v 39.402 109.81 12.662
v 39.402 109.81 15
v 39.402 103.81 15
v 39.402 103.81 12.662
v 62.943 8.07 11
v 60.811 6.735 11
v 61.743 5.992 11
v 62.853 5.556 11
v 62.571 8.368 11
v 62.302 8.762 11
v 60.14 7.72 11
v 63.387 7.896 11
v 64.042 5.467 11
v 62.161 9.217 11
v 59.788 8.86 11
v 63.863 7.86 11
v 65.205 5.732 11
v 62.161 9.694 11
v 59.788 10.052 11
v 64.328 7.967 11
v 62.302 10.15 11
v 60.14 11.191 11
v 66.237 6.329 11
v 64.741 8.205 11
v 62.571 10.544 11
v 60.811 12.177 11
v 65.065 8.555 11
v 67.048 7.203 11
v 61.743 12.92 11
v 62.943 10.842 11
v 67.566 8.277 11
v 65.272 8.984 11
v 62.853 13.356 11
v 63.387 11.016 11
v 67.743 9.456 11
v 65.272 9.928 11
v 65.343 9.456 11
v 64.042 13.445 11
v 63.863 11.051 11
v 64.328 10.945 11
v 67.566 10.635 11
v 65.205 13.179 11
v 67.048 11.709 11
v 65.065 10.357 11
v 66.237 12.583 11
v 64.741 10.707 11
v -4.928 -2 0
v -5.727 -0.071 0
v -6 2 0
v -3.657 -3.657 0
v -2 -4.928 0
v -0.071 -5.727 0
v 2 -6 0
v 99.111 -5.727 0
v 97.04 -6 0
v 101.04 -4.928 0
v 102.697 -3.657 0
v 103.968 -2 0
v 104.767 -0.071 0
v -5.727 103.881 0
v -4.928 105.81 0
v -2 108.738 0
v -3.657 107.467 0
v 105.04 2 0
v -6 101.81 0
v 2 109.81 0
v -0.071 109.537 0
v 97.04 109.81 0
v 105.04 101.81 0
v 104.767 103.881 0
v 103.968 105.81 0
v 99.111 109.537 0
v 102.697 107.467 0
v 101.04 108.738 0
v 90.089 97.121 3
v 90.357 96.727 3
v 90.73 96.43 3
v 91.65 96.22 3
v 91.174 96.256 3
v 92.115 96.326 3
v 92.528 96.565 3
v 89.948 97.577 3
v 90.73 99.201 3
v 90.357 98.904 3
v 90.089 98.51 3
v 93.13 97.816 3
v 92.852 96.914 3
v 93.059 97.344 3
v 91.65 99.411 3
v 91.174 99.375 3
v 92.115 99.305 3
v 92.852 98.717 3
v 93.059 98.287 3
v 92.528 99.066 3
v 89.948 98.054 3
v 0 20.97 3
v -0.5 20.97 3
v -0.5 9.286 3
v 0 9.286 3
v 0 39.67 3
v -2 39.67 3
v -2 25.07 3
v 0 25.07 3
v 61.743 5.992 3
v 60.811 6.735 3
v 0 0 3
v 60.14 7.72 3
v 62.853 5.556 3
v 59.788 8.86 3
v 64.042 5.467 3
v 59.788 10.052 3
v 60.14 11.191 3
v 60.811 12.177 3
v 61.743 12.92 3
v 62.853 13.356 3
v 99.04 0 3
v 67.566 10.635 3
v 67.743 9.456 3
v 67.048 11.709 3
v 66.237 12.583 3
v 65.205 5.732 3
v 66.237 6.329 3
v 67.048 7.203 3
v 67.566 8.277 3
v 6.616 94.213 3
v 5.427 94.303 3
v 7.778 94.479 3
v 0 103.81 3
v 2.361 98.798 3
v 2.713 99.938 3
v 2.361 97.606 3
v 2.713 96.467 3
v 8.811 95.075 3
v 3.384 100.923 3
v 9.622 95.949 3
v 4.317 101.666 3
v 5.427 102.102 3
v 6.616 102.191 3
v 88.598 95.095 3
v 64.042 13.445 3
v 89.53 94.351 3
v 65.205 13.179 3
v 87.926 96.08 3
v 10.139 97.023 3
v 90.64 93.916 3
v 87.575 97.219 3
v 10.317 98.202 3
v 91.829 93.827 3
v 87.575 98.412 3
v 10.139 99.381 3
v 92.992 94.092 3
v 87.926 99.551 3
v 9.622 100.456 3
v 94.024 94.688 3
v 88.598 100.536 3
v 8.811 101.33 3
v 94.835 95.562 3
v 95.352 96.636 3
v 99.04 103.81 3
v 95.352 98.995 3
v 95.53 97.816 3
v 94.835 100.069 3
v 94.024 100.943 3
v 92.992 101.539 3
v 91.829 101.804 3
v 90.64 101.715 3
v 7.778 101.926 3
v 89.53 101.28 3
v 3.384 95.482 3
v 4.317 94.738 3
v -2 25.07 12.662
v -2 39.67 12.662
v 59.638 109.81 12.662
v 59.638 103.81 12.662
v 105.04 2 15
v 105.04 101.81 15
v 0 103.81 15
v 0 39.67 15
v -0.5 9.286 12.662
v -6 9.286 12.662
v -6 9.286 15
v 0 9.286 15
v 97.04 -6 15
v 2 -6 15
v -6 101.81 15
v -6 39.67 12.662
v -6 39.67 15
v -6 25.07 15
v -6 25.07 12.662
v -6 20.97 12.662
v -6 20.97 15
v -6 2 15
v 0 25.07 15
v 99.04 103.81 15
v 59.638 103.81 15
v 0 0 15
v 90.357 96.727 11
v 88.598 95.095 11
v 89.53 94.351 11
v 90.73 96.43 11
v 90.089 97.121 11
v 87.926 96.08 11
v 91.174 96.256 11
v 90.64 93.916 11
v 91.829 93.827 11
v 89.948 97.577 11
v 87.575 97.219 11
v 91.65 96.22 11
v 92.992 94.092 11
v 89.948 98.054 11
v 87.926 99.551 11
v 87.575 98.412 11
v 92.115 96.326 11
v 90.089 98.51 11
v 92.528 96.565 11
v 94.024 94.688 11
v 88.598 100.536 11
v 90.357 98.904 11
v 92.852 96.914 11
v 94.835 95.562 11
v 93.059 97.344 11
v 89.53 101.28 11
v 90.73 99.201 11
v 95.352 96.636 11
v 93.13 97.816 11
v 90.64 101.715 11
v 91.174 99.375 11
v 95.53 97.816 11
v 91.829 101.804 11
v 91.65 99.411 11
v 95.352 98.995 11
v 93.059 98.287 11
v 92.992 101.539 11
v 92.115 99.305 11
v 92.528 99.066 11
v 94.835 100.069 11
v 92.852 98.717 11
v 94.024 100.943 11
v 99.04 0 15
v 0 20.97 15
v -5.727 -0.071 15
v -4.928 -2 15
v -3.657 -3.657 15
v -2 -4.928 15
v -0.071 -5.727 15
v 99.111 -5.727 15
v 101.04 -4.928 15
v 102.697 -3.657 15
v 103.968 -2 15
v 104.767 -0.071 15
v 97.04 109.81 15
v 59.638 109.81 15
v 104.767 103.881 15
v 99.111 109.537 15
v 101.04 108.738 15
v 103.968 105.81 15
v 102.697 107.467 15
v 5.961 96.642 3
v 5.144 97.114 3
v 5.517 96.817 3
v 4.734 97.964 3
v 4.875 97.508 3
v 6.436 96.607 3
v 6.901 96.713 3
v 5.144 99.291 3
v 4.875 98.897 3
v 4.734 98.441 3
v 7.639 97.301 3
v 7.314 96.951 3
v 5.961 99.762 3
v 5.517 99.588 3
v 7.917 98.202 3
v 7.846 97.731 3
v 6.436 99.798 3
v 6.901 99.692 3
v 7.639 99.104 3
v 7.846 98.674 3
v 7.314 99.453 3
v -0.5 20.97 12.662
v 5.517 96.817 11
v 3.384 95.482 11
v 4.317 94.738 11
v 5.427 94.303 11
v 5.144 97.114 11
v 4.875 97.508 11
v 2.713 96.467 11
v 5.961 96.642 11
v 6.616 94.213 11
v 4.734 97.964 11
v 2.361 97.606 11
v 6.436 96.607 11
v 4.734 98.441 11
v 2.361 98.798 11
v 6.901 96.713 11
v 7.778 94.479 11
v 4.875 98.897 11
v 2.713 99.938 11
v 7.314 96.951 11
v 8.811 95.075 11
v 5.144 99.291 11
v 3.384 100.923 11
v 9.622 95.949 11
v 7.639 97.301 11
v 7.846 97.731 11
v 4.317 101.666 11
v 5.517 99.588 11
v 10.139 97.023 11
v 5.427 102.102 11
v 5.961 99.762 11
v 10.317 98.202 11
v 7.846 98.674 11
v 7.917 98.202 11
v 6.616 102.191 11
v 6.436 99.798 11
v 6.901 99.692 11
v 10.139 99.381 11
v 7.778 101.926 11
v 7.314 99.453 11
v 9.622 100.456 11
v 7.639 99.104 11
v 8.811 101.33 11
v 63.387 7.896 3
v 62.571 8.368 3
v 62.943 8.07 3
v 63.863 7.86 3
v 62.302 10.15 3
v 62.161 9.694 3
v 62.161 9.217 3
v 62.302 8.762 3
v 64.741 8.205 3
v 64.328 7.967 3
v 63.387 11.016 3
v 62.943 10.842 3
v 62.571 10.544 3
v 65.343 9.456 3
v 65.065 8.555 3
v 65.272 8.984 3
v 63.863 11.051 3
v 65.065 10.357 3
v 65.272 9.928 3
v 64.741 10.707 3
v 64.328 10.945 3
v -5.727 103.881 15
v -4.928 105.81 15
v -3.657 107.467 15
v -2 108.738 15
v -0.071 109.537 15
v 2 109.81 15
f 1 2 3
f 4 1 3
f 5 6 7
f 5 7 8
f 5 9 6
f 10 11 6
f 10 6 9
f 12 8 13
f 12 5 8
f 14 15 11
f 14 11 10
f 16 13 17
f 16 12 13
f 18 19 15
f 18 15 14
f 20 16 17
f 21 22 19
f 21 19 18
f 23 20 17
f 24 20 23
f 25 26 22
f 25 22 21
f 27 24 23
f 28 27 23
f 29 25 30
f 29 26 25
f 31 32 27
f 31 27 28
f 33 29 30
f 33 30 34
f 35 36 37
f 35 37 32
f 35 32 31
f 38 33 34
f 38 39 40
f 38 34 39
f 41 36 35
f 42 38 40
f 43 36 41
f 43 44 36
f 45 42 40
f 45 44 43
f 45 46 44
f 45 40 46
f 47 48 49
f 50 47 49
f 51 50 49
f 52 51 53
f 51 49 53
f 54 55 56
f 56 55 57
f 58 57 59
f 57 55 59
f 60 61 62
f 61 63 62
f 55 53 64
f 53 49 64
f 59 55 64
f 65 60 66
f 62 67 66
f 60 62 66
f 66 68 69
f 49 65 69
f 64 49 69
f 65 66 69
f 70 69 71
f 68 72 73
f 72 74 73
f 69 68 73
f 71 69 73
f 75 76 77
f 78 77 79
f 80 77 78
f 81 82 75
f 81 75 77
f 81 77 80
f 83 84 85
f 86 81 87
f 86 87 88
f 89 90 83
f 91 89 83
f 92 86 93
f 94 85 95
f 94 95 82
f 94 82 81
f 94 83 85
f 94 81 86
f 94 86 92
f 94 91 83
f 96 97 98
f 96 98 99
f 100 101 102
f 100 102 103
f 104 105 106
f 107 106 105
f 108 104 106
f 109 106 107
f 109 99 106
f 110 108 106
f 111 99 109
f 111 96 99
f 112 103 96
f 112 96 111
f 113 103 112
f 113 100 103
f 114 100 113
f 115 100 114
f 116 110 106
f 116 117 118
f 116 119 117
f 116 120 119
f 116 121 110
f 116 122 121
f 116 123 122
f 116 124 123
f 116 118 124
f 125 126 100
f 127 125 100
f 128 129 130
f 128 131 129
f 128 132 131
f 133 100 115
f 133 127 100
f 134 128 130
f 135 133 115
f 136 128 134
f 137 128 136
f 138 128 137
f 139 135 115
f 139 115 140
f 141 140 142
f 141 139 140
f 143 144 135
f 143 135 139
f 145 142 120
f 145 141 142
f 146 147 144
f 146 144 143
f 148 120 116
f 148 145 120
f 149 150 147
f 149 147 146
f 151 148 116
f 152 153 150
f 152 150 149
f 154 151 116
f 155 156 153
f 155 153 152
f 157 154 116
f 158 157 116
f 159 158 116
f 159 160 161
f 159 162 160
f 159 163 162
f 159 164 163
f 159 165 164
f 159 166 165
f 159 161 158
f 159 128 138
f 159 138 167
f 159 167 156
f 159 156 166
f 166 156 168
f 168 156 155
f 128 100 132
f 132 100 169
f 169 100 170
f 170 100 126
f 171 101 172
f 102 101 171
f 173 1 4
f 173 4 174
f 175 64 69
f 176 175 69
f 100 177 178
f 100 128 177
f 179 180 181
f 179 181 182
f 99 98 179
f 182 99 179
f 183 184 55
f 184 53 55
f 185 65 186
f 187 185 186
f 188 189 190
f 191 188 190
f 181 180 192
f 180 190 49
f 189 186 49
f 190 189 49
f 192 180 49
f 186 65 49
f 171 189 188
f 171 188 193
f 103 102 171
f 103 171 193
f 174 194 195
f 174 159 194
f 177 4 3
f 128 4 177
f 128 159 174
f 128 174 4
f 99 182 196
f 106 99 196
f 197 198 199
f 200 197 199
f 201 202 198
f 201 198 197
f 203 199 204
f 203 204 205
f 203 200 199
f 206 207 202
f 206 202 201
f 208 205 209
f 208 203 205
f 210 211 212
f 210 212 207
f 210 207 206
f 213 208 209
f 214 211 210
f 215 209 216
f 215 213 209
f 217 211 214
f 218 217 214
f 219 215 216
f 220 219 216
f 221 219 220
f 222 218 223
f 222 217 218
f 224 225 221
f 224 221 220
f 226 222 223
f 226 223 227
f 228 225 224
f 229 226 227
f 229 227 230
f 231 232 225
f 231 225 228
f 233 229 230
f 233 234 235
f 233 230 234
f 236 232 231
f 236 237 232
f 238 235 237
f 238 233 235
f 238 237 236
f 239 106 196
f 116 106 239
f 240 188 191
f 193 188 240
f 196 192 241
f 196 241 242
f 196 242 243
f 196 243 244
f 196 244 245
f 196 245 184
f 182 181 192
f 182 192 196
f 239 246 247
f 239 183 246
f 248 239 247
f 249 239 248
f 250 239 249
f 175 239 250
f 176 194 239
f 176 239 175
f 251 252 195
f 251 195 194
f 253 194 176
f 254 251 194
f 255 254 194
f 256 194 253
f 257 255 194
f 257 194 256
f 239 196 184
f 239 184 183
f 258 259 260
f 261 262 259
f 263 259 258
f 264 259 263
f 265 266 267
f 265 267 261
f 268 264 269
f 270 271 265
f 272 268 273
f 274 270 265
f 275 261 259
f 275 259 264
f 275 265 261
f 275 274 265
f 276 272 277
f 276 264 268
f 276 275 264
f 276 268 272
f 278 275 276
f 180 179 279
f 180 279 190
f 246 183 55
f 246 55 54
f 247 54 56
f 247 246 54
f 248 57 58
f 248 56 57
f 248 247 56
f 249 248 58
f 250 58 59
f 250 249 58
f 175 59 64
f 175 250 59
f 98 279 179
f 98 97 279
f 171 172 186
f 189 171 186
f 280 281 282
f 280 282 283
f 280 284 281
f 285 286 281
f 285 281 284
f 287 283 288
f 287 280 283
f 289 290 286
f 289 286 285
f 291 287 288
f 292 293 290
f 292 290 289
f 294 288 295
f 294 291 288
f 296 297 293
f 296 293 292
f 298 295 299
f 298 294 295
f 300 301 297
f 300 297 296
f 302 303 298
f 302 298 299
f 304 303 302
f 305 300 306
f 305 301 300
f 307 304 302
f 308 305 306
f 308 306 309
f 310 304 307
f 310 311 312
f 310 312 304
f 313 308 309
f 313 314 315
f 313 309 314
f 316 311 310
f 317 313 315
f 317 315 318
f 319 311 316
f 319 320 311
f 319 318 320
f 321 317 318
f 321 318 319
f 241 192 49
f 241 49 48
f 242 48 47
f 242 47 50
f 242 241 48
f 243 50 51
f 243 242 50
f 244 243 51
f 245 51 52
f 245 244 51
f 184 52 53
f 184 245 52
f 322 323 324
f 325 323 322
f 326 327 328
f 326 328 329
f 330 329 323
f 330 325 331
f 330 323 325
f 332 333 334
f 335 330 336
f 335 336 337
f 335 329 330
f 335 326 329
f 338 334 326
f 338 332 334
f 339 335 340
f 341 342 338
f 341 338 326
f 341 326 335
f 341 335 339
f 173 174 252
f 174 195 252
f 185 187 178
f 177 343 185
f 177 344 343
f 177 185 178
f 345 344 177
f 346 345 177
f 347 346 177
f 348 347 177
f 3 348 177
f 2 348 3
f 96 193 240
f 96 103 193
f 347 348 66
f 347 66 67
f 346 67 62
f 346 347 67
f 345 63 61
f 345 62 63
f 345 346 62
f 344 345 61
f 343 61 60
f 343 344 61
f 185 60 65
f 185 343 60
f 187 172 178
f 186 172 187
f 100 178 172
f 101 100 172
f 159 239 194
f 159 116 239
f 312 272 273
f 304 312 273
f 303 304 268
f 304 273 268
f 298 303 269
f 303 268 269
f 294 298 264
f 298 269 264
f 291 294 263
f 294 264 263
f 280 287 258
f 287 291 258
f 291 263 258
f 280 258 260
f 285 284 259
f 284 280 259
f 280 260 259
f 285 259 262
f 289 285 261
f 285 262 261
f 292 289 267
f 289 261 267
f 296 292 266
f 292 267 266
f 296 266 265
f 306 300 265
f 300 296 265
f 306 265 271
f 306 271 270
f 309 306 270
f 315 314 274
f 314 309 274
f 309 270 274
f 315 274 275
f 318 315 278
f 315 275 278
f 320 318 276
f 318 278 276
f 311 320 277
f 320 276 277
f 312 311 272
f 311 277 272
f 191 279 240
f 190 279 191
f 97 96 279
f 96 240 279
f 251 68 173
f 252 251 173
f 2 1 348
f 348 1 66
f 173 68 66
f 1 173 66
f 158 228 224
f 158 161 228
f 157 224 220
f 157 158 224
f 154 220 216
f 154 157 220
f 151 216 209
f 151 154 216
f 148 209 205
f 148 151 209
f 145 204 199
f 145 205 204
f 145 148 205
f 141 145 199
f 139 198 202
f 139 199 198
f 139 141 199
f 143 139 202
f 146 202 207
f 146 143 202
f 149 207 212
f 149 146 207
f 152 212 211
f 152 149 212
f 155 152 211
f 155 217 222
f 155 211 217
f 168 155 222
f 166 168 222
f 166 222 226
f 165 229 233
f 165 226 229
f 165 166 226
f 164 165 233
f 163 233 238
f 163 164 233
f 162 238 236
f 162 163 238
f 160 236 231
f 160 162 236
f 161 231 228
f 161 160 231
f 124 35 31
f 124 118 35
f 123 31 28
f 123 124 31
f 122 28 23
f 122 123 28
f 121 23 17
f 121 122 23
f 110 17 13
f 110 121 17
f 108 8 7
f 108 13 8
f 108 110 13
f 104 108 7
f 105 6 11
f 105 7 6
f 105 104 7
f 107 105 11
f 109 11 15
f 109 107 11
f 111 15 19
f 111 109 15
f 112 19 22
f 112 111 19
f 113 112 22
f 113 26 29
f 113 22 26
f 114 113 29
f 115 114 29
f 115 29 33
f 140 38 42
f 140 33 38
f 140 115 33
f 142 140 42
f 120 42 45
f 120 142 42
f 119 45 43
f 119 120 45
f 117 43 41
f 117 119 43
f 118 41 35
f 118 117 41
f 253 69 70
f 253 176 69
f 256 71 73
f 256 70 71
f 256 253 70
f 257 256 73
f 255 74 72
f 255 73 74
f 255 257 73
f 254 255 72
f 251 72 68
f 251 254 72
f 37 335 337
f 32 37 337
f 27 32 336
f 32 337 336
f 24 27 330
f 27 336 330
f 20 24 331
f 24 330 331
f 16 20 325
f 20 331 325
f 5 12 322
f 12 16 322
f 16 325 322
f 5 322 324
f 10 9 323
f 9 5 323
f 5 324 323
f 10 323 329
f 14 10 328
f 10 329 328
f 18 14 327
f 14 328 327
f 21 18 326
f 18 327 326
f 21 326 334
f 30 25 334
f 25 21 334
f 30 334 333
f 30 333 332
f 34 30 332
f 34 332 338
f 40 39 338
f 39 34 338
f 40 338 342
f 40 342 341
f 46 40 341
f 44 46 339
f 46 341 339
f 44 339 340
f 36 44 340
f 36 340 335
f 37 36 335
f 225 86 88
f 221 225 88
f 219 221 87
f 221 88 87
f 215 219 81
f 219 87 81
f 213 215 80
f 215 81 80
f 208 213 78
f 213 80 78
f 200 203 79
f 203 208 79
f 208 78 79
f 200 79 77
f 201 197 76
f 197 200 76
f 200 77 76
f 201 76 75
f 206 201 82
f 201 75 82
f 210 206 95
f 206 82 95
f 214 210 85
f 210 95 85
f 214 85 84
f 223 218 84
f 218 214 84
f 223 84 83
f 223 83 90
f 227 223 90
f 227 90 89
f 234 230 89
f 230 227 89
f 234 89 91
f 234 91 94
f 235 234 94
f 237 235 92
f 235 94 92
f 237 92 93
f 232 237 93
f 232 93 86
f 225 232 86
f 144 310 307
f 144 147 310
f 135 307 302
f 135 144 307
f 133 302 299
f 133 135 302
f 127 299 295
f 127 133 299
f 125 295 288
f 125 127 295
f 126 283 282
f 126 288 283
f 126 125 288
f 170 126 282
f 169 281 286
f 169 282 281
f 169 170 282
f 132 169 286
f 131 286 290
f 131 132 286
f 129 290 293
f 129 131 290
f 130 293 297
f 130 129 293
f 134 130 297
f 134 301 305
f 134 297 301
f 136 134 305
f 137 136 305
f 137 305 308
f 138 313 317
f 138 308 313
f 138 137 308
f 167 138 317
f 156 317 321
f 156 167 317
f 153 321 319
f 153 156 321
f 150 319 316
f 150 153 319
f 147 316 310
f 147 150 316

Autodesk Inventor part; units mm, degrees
ref_plane "YZ Plane" through (0, 0, 0) normal (1, 0, 0) x (0, 1, 0)
ref_plane "XZ Plane" through (0, 0, 0) normal (0, 1, 0) x (-1, 0, 0)
sketch "Sketch1" plane through (0, 0, 0) normal (0, 0, 1) x (1, 0, 0)
  line L0 (0, 103.81) -> (0, 0)
  line L1 (99.04, 103.81) -> (0, 103.81)
  line L2 (99.04, 0) -> (99.04, 103.81)
  circle A0 centre (91.5302, 97.8155) radius 1.6
  circle A1 centre (6.3166, 98.2023) radius 1.6
  circle A2 centre (63.7434, 9.4559) radius 1.6
  line L3 (-2.8877, 39.67) -> (-2.8877, 25.07)
  line L4 (18.04, 39.67) -> (-2.8877, 39.67)
  line L5 (-2.8877, 25.07) -> (18.04, 25.07)
  line L6 (5.99, 20.97) -> (-0.5, 20.97)
  line L7 (-0.5, 20.97) -> (-0.5, 9.286)
  line L8 (-0.5, 9.286) -> (5.99, 9.286)
  line L9 (5.99, 9.286) -> (5.99, 20.97)
  line L10 (18.04, 25.07) -> (18.04, 39.67)
  line L11 (0, 0) -> (99.04, 0)
  line L12 (-2, 105.81) -> (-2, -2)
  line L13 (-2, -2) -> (101.04, -2)
  line L14 (101.04, -2) -> (101.04, 105.81)
  line L15 (101.04, 105.81) -> (-2, 105.81)
  line L16 (-6, 109.81) -> (-6, -6)
  line L17 (-6, -6) -> (105.04, -6)
  line L18 (105.04, -6) -> (105.04, 109.81)
  line L19 (105.04, 109.81) -> (-6, 109.81)
  point P0 (-2, 25.07)
  point P1 (-2, 39.67)
  point P2 (0, 39.67)
  point P3 (0, 9.286)
  point P4 (0, 20.97)
  point P5 (0, 25.07)
  dimension "d0" = 2
  dimension "d1" = 4
extrude "Extrusion1" add sketch "Sketch1" along normal blind 15 contours L0 L4 L12 L15 L14 L13 L5 L6 L7 L8 L11 L2 L1 | L12 L5 L3 L4 | L19 L18 L17 L16
extrude "Extrusion2" add sketch "Sketch1" along normal blind 3 contours L1 L2 L11 L0 L8 L9 L6 L5 L10 L4 | L4 L10 L5 L0 | L0 L5 L12 L4 | L6 L9 L8 L0 | L0 L8 L7 L6 | A0 | A1 | A2
sketch "Sketch2" plane through (0, 0, 3) normal (0, 0, 1) x (1, 0, 0)
  circle A0 centre (63.7434, 9.4559) radius 1.6 projected
  circle A1 centre (91.5302, 97.8155) radius 1.6 projected
  circle A2 centre (6.3166, 98.2023) radius 1.6 projected
  circle A3 centre (6.3166, 98.2023) radius 4
  circle A4 centre (91.5302, 97.8155) radius 4
  circle A5 centre (63.7434, 9.4559) radius 4
  point P0 (0, 0)
  dimension "d8" = 8
  dimension "d9" = 8
  dimension "d10" = 8
extrude "Extrusion4" add sketch "Sketch2" along normal blind 8
ref_plane "Work Plane1" through (0, 0, 12.662) normal (0, 0, -1) x (-1, 0, 0)
sketch "Sketch3" plane through (0, 0, 12.662) normal (0, 0, -1) x (-1, 0, 0)
  line L0 (2, 25.07) -> (2, 39.67) projected
  line L1 (2, 39.67) -> (6, 39.67)
  line L2 (6, 109.81) -> (6, -6) projected
  line L3 (0, 20.97) -> (0, 25.07) projected
  line L4 (6, 39.67) -> (0, 39.67)
  line L5 (0, 39.67) -> (0, 25.07)
  line L6 (0, 25.07) -> (6, 25.07)
  line L7 (6, 25.07) -> (6, 39.67)
  line L8 (0.5, 20.97) -> (0, 20.97) projected
  line L9 (0.5, 20.97) -> (6, 20.97)
  line L10 (0, 9.286) -> (0.5, 9.286) projected
  line L11 (0.5, 9.286) -> (6, 9.286)
  line L12 (6, 9.286) -> (6, 20.97)
  line L13 (0.5, 9.286) -> (0.5, 20.97) projected
  line L14 (0.5, 20.97) -> (0.5, 9.286)
  point P0 (0, 0)
extrude "Extrusion5" cut sketch "Sketch3" against normal blind 8 contours L6 L5 L4 L0 | L0 L1 L2 L6 | L2 L11 L13 L9
fillet "Fillet1" radius 8 4 edges at (-6, 109.81, 7.5) (-6, -6, 7.5) (105.04, -6, 7.5) (105.04, 109.81, 7.5)
sketch "Sketch4" plane through (0, 0, 15) normal (0, 0, 1) x (1, 0, 0)
  line L0 (97.04, 109.81) -> (2, 109.81) projected
  line L1 (2, 109.81) -> (97.04, 109.81)
  line L2 (0, 103.81) -> (99.04, 103.81) projected
  line L3 (39.4018, 103.81) -> (59.6382, 103.81)
  line L4 (59.6382, 103.81) -> (59.6382, 109.81)
  line L5 (59.6382, 109.81) -> (39.4018, 109.81)
  line L6 (39.4018, 109.81) -> (39.4018, 103.81)
  line L7 (39.4018, 103.81) -> (59.6382, 109.81) construction
  line L8 (59.6382, 103.81) -> (39.4018, 109.81) construction
  point P0 (0, 0)
  point P1 (49.52, 106.81)
extrude "Extrusion6" cut sketch "Sketch4" against normal up to surface (2.338 mm away)
properties part number "Base"
